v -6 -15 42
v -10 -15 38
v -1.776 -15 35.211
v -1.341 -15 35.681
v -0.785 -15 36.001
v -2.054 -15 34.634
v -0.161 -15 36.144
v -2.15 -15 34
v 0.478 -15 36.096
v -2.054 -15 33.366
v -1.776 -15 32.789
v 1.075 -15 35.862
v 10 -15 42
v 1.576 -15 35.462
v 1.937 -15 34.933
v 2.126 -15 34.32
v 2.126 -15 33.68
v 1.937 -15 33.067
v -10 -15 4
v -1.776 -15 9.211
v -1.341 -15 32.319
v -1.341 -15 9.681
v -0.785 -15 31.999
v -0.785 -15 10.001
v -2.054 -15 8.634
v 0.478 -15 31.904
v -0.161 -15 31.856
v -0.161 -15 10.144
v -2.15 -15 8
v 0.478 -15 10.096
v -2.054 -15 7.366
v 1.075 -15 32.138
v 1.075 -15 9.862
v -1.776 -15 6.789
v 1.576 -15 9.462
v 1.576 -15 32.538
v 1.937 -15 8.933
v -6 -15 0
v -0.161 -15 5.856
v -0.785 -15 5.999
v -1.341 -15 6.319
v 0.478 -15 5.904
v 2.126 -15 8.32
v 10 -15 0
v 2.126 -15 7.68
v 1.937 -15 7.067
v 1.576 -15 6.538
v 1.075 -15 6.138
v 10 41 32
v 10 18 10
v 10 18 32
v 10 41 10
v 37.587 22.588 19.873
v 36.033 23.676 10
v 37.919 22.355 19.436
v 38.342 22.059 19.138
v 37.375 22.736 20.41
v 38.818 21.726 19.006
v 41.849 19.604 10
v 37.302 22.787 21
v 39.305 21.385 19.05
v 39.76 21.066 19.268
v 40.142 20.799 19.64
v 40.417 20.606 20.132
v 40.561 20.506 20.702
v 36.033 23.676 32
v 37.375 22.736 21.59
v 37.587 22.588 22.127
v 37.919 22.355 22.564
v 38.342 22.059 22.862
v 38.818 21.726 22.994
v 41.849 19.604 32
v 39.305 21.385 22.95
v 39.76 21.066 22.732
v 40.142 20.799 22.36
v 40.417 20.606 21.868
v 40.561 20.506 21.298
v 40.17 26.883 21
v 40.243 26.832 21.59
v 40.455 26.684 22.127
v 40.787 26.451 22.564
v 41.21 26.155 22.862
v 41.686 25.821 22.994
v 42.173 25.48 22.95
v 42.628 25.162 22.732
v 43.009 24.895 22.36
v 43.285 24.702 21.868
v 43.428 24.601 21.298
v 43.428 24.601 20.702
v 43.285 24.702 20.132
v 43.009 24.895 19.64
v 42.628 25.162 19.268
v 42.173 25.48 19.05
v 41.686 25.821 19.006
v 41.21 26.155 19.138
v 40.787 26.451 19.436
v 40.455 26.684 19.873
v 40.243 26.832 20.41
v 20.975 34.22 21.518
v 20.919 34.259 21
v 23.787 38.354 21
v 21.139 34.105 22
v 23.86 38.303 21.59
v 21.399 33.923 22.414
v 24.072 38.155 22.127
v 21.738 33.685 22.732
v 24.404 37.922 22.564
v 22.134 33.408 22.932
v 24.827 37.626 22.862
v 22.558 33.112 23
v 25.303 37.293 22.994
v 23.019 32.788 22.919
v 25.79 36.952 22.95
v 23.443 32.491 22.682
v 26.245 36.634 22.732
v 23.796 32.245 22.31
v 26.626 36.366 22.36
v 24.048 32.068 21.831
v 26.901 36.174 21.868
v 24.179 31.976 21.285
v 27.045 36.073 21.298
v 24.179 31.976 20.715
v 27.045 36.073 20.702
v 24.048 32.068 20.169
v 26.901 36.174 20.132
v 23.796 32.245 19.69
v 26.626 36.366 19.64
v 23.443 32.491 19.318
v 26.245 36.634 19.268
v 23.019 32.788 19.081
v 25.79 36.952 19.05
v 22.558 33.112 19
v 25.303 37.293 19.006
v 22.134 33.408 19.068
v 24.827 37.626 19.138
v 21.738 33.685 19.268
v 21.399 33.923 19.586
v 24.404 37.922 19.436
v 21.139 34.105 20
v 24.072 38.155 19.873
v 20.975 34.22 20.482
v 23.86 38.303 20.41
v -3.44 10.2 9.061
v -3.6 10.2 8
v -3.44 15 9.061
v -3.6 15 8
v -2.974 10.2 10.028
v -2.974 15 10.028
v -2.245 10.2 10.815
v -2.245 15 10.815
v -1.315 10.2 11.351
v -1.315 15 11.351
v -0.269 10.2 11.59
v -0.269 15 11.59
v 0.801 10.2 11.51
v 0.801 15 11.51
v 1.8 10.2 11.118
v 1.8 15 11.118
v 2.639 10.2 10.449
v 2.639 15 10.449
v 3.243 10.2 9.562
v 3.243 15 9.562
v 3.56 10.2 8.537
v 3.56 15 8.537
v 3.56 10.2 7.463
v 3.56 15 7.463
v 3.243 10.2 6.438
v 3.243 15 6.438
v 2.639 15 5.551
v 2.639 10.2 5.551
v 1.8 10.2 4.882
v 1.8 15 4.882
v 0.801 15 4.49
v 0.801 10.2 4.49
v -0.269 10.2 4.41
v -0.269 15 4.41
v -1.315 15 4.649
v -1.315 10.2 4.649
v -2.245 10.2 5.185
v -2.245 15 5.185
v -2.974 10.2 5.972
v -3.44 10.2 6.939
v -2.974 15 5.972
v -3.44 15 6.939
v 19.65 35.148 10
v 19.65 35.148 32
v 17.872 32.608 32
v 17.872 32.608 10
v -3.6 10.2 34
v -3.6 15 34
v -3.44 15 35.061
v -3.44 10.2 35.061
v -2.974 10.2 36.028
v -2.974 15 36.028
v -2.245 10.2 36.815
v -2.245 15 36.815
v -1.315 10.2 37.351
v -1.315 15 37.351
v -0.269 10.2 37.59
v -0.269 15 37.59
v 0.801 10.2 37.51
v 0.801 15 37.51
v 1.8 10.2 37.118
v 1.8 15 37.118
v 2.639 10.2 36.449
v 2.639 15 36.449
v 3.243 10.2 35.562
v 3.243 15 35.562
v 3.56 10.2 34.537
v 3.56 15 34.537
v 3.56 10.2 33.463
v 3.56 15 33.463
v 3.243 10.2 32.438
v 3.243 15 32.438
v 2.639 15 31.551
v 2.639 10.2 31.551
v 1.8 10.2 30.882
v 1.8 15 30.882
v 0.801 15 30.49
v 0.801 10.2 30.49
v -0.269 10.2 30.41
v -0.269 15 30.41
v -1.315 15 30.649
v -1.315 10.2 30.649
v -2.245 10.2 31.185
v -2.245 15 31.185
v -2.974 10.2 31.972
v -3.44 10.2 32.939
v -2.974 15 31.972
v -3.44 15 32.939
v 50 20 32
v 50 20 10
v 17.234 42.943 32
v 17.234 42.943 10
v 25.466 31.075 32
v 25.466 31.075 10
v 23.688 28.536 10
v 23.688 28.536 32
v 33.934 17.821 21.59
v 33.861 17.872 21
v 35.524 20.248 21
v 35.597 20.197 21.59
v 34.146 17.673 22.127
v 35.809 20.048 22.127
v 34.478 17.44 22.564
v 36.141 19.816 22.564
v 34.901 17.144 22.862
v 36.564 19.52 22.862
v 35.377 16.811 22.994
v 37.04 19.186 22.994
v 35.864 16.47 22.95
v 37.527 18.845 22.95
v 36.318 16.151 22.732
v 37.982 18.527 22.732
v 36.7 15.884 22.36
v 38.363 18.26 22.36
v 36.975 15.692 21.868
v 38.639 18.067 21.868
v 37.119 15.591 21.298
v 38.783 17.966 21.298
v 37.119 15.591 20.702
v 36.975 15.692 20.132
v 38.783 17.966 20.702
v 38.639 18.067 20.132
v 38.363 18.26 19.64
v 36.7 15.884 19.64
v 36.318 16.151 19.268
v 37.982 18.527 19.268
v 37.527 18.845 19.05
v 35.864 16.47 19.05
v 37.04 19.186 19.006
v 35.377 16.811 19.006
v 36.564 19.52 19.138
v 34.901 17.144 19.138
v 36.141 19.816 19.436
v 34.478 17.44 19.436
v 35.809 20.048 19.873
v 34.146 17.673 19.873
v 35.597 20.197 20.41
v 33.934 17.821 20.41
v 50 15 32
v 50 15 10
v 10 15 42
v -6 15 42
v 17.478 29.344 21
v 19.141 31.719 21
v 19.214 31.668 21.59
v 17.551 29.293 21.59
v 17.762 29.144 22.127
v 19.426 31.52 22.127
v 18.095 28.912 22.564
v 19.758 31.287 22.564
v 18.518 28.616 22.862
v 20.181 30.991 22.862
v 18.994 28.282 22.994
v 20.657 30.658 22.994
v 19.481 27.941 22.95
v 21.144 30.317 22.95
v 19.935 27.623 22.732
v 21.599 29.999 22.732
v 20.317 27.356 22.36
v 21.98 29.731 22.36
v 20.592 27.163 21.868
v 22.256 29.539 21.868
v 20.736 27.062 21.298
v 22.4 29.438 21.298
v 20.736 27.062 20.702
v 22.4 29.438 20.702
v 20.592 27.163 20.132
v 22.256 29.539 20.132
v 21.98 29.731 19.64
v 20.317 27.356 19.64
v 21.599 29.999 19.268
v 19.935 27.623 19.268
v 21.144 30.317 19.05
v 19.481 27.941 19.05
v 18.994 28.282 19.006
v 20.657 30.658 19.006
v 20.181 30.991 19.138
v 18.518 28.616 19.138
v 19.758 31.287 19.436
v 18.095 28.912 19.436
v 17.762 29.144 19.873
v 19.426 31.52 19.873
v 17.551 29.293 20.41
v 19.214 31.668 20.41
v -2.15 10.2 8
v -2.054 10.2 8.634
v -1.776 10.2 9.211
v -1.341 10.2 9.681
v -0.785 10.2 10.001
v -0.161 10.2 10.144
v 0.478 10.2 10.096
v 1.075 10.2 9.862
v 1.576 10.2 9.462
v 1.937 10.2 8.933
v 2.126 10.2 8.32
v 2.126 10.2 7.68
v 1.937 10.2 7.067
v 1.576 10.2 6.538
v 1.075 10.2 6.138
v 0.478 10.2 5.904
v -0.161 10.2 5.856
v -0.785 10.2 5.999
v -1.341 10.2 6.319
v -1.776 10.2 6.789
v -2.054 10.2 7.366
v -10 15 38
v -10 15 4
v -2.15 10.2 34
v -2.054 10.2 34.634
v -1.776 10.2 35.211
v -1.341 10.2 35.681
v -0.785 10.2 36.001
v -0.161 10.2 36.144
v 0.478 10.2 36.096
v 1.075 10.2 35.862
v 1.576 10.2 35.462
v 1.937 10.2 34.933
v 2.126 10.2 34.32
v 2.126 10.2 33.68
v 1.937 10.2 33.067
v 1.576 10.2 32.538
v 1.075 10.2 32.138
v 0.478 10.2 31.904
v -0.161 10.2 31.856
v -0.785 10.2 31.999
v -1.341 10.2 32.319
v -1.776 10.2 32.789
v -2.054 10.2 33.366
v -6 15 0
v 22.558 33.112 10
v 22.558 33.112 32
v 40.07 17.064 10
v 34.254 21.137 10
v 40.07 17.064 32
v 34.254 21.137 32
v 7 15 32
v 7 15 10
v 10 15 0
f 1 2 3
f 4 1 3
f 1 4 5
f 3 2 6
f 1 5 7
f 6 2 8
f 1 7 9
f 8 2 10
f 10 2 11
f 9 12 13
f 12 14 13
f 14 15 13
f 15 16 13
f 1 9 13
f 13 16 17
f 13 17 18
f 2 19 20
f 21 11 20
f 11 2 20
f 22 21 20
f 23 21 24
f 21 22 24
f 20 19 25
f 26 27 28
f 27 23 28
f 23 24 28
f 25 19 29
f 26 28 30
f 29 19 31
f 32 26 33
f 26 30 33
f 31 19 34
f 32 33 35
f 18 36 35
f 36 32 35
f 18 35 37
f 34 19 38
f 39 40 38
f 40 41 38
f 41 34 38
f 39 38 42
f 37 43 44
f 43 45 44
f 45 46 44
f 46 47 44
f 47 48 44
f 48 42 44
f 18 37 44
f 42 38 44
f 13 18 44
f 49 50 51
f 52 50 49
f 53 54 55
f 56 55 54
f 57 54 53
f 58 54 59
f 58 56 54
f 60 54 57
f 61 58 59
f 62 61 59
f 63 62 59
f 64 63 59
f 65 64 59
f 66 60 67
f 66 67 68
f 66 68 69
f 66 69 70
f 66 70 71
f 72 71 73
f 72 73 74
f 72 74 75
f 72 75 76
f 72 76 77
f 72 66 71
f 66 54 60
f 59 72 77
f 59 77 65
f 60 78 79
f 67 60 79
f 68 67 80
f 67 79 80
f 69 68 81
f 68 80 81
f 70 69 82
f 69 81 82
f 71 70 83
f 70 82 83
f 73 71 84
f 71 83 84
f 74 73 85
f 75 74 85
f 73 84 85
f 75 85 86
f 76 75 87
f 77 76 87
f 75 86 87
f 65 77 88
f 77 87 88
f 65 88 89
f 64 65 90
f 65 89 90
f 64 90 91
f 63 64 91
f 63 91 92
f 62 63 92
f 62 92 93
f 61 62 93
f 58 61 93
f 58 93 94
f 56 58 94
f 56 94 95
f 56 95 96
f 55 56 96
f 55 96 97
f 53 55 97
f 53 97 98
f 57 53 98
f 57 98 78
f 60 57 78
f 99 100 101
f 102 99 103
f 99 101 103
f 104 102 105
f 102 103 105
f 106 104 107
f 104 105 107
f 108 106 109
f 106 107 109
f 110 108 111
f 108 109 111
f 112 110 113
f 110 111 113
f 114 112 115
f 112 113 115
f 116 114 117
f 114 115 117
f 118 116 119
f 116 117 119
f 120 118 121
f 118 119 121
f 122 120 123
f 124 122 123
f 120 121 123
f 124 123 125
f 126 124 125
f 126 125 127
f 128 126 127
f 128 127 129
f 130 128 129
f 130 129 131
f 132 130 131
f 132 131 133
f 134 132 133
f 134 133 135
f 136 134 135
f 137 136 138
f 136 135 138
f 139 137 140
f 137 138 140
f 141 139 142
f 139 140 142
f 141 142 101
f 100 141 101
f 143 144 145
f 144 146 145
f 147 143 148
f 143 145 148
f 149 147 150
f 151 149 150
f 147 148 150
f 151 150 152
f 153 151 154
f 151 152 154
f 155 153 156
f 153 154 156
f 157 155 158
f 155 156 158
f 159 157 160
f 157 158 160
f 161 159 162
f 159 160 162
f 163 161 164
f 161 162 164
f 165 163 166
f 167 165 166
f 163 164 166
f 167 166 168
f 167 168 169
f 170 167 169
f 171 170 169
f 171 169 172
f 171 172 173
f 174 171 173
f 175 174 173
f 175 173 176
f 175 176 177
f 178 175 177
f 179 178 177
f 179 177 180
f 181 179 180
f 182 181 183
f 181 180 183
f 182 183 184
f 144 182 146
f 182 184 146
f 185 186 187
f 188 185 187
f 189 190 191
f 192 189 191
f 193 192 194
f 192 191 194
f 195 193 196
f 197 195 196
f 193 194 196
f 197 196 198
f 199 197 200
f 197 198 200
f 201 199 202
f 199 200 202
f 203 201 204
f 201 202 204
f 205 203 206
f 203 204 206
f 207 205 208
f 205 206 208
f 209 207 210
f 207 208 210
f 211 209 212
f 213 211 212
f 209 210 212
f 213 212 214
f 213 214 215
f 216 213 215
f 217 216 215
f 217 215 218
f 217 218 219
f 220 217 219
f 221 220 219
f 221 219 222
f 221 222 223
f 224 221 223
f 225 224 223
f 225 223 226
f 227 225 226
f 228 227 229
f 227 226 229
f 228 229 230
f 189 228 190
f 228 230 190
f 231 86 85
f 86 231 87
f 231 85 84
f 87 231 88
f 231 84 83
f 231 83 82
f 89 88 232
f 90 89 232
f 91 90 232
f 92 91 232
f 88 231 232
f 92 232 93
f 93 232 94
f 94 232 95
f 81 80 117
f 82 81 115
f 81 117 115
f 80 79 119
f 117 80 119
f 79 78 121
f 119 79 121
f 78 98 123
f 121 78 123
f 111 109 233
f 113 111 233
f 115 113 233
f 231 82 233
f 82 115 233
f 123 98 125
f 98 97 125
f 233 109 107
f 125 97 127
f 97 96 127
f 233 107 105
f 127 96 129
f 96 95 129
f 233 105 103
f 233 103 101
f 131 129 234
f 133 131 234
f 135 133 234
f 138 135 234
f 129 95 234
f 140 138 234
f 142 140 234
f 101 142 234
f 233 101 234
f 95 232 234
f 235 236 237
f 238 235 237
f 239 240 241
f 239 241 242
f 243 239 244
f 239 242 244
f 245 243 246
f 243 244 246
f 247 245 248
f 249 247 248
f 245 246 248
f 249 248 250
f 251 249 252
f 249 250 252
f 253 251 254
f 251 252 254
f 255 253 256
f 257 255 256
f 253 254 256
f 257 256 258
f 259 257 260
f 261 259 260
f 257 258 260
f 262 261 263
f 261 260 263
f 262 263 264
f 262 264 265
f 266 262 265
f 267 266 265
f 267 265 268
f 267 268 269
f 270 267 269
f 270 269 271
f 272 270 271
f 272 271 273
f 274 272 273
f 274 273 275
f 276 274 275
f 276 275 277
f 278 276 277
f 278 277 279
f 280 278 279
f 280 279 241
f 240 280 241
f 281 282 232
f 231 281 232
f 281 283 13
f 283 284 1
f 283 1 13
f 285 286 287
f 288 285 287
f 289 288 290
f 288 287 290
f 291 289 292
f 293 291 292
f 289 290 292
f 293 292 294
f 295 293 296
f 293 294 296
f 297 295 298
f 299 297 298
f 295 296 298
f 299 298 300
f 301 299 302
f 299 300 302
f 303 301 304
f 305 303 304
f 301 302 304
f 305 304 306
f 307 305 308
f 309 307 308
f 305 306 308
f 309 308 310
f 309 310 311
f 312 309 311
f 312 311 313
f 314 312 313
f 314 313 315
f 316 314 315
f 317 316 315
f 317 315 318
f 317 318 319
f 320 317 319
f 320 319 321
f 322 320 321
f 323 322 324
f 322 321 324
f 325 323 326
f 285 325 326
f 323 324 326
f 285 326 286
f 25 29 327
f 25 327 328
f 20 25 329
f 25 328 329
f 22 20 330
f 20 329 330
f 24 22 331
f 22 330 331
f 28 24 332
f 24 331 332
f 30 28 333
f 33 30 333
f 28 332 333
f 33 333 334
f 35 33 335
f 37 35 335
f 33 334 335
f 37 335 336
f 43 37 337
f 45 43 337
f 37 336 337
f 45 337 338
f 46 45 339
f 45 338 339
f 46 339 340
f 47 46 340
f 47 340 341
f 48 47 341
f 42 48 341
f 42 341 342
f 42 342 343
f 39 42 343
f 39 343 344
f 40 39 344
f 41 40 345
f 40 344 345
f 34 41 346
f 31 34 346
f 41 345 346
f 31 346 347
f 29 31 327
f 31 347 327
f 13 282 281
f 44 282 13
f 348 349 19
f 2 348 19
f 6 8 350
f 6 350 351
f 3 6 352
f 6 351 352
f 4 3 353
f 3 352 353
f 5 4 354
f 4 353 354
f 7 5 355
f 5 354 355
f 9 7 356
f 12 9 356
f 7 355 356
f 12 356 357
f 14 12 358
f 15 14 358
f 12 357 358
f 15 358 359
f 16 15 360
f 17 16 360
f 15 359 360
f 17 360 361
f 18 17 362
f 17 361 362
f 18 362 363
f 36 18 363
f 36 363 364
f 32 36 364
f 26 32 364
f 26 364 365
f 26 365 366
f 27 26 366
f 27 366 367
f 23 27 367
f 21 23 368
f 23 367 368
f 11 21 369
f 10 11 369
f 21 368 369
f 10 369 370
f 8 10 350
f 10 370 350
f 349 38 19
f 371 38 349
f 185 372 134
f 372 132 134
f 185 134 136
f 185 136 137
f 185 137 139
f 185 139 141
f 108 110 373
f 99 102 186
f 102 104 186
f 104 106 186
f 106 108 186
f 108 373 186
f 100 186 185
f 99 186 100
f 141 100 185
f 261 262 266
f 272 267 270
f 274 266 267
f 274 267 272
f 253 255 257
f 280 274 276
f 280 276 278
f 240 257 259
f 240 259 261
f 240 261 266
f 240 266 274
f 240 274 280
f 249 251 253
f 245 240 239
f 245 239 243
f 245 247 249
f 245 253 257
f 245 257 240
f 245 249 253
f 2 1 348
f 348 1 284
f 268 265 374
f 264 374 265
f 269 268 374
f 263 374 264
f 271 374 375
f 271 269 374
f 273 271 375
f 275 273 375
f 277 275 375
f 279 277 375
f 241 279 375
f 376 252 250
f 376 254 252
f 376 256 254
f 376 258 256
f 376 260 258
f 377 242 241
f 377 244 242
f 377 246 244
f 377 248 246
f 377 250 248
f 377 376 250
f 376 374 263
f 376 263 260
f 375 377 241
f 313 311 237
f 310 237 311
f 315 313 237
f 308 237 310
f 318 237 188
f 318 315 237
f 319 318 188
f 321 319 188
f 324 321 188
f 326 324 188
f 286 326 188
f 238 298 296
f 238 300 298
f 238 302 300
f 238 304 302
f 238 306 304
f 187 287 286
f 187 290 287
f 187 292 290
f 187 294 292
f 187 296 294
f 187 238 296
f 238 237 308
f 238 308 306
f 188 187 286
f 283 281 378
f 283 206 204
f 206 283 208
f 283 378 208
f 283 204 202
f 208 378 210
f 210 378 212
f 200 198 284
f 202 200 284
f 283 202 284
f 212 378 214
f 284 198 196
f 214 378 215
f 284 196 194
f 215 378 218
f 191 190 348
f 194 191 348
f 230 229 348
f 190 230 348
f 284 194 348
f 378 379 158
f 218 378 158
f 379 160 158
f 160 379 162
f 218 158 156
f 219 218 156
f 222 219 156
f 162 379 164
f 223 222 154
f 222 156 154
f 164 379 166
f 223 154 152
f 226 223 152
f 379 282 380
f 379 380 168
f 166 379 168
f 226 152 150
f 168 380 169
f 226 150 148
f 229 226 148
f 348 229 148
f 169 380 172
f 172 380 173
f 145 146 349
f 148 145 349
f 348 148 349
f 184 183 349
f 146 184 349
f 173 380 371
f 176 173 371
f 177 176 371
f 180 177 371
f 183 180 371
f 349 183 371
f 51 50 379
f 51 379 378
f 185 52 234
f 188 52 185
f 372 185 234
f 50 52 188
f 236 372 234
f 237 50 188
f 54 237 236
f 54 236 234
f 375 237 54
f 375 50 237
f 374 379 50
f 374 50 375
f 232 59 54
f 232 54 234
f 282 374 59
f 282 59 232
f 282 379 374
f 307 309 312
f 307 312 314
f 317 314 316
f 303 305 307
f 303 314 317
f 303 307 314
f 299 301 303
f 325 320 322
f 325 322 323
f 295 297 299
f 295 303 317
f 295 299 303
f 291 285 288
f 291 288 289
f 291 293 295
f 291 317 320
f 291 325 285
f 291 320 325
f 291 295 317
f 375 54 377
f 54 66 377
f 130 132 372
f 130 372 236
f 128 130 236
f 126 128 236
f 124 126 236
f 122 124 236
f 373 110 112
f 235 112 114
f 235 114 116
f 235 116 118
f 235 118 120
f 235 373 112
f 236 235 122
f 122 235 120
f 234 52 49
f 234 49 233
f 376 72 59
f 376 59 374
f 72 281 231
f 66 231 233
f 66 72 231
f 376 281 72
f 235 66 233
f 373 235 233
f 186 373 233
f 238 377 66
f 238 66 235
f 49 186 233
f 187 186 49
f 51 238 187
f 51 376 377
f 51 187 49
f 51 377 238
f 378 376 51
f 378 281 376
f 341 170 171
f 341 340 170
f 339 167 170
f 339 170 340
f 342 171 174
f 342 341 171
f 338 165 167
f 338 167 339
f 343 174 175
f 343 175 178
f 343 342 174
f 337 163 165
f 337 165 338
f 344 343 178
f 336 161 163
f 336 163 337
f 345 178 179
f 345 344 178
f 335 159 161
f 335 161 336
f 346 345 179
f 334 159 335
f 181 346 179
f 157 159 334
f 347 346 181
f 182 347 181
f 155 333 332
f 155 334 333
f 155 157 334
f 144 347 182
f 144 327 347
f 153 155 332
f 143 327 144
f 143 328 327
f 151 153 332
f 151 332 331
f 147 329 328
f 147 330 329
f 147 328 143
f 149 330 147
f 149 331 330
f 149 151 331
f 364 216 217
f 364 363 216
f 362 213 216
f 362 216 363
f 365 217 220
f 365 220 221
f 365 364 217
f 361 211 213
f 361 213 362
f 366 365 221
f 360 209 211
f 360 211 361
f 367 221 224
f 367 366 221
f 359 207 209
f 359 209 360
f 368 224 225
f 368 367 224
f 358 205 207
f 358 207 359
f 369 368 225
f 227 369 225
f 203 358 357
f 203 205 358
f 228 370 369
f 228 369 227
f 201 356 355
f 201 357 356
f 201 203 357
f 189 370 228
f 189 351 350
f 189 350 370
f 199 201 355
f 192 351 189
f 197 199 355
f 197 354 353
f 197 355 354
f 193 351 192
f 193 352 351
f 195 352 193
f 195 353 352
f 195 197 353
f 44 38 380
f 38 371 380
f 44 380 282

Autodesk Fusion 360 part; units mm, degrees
sketch "Sketch1" plane through (0, 0, 0) normal (0, 0, 1) x (1, 0, 0) in component "Spool Holder"
  line L0 (10, 15) -> (-10, 15)
  line L1 (-10, 15) -> (-10, -15)
  line L2 (-10, -15) -> (10, -15)
  line L3 (10, -15) -> (10, 15)
  line L4 (10, 15) -> (-10, -15) construction
  line L5 (-10, 15) -> (10, -15) construction
  line L6 (10, 15) -> (50, 15)
  line L7 (50, 15) -> (50, 20)
  line L8 (50, 20) -> (17.2339, 42.9431)
  line L9 (50, 20) -> (46.0037, 20) construction
  line L10 (50, 15) -> (10, -15)
  line L11 (17.2339, 42.9431) -> (10, 32.612)
  line L12 (17.2339, 42.9431) -> (32.2339, 42.9431) construction
  line L13 (10, 15) -> (10, 32.612)
  line L14 (10, 32.612) -> (10, 41)
  line L15 (10, 41) -> (17.2339, 42.9431)
  dimension "d1" = 30
  dimension "d2" = 20
  dimension "d3" = 40
  dimension "d4" = 5
  dimension "d5" = 145
  dimension "d6" = 40
  dimension "d7" = 125
extrude "Extrude1" add sketch "Sketch1" along normal blind 42 in component "Spool Holder"
sketch "Sketch2" plane through (0, 0, 42) normal (0, 0, 1) x (-1, 0, 0) in component "Spool Holder"
  line L0 (10, -15) -> (10, 15)
  line L1 (10, 15) -> (-10, 15)
  line L2 (-10, 15) -> (-50, -15)
  line L3 (-50, -15) -> (-50, -20)
  line L4 (-50, -20) -> (-17.2339, -42.9431)
  line L5 (-10, -41) -> (-10, -15)
  line L6 (-10, -15) -> (10, -15)
  line L7 (-10, -15) -> (-50, -15)
  line L8 (-17.2339, -42.9431) -> (-10, -41)
extrude "Extrude2" cut sketch "Sketch2" against normal blind 10 contours L3 L4 L5 L7 L8 in component "Spool Holder"
sketch "Sketch3" plane through (0, 0, 0) normal (0, 0, -1) x (1, 0, 0) in component "Spool Holder"
  line L0 (-10, 15) -> (-10, -15)
  line L1 (-10, -15) -> (10, -15)
  line L2 (10, -15) -> (10, -41)
  line L3 (17.2339, -42.9431) -> (50, -20)
  line L4 (50, -20) -> (50, -15)
  line L5 (50, -15) -> (10, 15)
  line L6 (10, 15) -> (-10, 15)
  line L7 (10, -15) -> (50, -15)
  line L8 (10, -41) -> (17.2339, -42.9431)
extrude "Extrude3" cut sketch "Sketch3" against normal blind 10 contours L2 L3 L4 L7 L8 in component "Spool Holder"
sketch "Sketch4" plane through (0, 15, 0) normal (0, 1, 0) x (-1, 0, 0) in component "Spool Holder"
  line L0 (-50, 0) -> (10, 0)
  line L1 (10, 0) -> (10, 42)
  line L2 (10, 42) -> (-50, 42)
  line L3 (-50, 42) -> (-50, 32)
  line L4 (-50, 32) -> (-10, 32)
  line L5 (-10, 32) -> (-10, 10)
  line L6 (-10, 10) -> (-50, 10)
  line L7 (-50, 10) -> (-50, 0)
  line L8 (-10, 32) -> (-10, 42)
  line L9 (-10, 10) -> (-10, 0)
  line L10 (-10, 42) -> (-50, 32)
  line L11 (-10, 0) -> (-50, 10)
  point P0 (-10, 0)
extrude "Extrude4" cut sketch "Sketch4" along normal up to surface contours L0 L7 L11 | L2 L3 L10 end surface through (50, 15, 0) normal (0.6, -0.8, 0) offset 0 in component "Spool Holder"
sketch "Sketch5" plane through (0, 0, 32) normal (0, 0, 1) x (-1, 0, 0) in component "Spool Holder"
  line L0 (-10, -15) -> (-50, -15)
  line L1 (-50, -15) -> (-50, -20)
  line L2 (-50, -20) -> (-17.2339, -42.9431)
  line L3 (-10, -41) -> (-10, -15)
  line L4 (-17.2339, -42.9431) -> (-14.366, -38.8473) construction
  line L5 (-14.366, -38.8473) -> (-54.355, -10.8467) construction
  line L6 (-14.366, -38.8473) -> (-12.5879, -36.3079) construction
  line L7 (-12.5879, -36.3079) -> (-56.8094, -5.3437) construction
  line L8 (-50, -20) -> (-45.354, -13.3649) construction
  line L9 (-50, -20) -> (-58.1, -20) construction
  line L10 (-14.366, -38.8473) -> (-22.5576, -33.1115) construction
  line L11 (-22.5576, -33.1115) -> (-20.7795, -30.5722) construction
  line L12 (-47.1321, -15.9042) -> (-38.9406, -21.64) construction
  line L13 (-38.9406, -21.64) -> (-37.1625, -19.1006) construction
  line L14 (-22.5576, -33.1115) -> (-25.4655, -31.0753)
  line L15 (-25.4655, -31.0753) -> (-23.6875, -28.536)
  line L16 (-22.5576, -33.1115) -> (-19.6496, -35.1477)
  line L17 (-19.6496, -35.1477) -> (-17.8715, -32.6084)
  line L18 (-23.6875, -28.536) -> (-17.8715, -32.6084)
  line L19 (-38.9406, -21.64) -> (-41.8486, -19.6038)
  line L20 (-41.8486, -19.6038) -> (-40.0705, -17.0644)
  line L21 (-38.9406, -21.64) -> (-36.0326, -23.6762)
  line L22 (-36.0326, -23.6762) -> (-34.2545, -21.1368)
  line L23 (-40.0705, -17.0644) -> (-34.2545, -21.1368)
  line L24 (-17.2339, -42.9431) -> (-10, -41)
  dimension "d17" = 5
  dimension "d18" = 3.1
  dimension "d19" = 125
  dimension "d20" = 8.1
  dimension "d21" = 10
  dimension "d22" = 10
  dimension "d23" = 3.55
  dimension "d24" = 3.55
  dimension "d25" = 3.55
  dimension "d26" = 3.55
extrude "Extrude5" cut sketch "Sketch5" against normal up to surface (22 mm away) contours L14 L15 L16 L17 L18 | L19 L20 L21 L22 L23 in component "Spool Holder"
sketch "Sketch6" plane through (25.8464, 36.9125, 0) normal (0.5736, 0.8192, 0) x (-0.8192, 0.5736, 0) in component "Spool Holder"
  line L0 (-29.4861, 10) -> (10.5139, 10)
  line L1 (10.5139, 32) -> (-29.4861, 32)
  line L2 (-29.4861, 32) -> (-29.4861, 10)
  line L3 (10.5139, 10) -> (10.5139, 32) construction
  line L4 (10.5139, 21) -> (-29.4861, 21) construction
  line L5 (10.5139, 21) -> (0.5139, 21) construction
  line L6 (-29.4861, 21) -> (-19.4861, 21) construction
  circle A0 centre (0.5139, 21) radius 2
  circle A1 centre (-19.4861, 21) radius 2
  line L7 (10.5139, 10) -> (10.5139, 32)
  dimension "d29" = 10
  dimension "d30" = 10
  dimension "d31" = 4
  dimension "d32" = 4
extrude "Extrude6" cut sketch "Sketch6" against normal blind 11 contours A0 | A1 in component "Spool Holder"
sketch "Sketch7" plane through (0, 15, 0) normal (0, 1, 0) x (-1, 0, 0) in component "Spool Holder"
  line L0 (-10, 42) -> (-50, 32)
  line L1 (-50, 32) -> (-10, 32)
  line L2 (-10, 32) -> (-10, 10)
  line L3 (-10, 10) -> (-50, 10)
  line L4 (-50, 10) -> (-10, 0)
  line L5 (-10, 0) -> (10, 0)
  line L6 (10, 0) -> (10, 42)
  line L7 (10, 42) -> (-10, 42)
  line L8 (-10, 42) -> (-10, 0) construction
  line L9 (-10, 42) -> (10, 42) construction
  line L10 (0, 42) -> (0, 0) construction
  line L11 (0, 42) -> (0, 34) construction
  line L12 (0, 0) -> (0, 8) construction
  circle A0 centre (0, 34) radius 3.6
  circle A1 centre (0, 8) radius 3.6
  dimension "d35" = 8
  dimension "d36" = 8
  dimension "d37" = 7.2
  dimension "d38" = 7.2
extrude "Extrude7" cut sketch "Sketch7" against normal blind 4.8 contours A0 | A1 in component "Spool Holder"
sketch "Sketch8" plane through (0, 15, 0) normal (0, 1, 0) x (-1, 0, 0) in component "Spool Holder"
  circle A0 centre (0, 8) radius 3.6
  circle A1 centre (0, 34) radius 3.6
  line L0 (-10, 42) -> (-50, 32)
  line L1 (-50, 32) -> (-10, 32)
  line L2 (-10, 32) -> (-10, 10)
  line L3 (-10, 10) -> (-50, 10)
  line L4 (-50, 10) -> (-10, 0)
  line L5 (-10, 0) -> (10, 0)
  line L6 (10, 0) -> (10, 42)
  line L7 (10, 42) -> (-10, 42)
  circle A2 centre (0, 8) radius 2.15
  circle A3 centre (0, 34) radius 2.15
  dimension "d41" = 4.3
  dimension "d42" = 4.3
extrude "Extrude8" cut sketch "Sketch8" against normal up to surface (30 mm away) contours A2 | A3 in component "Spool Holder"
chamfer "Chamfer1" distance 4 angle 45 2 edges at (-10, 0, 0) (-10, 0, 42) in component "Spool Holder"
chamfer "Chamfer2" distance 3 angle 45 1 edges at (10, 15, 21) in component "Spool Holder"
component "Spool Holder" placed x (1, 0, 0) y (0, 1, 0) z (0, 0, 1) at (0, 0, 0)
equation "d23 = ( 7.1 / 2 ) * 1 mm"
equation "d24 = ( 7.1 / 2 ) * 1 mm"
equation "d25 = ( 7.1 / 2 ) * 1 mm"
equation "d26 = ( 7.1 / 2 ) * 1 mm"
